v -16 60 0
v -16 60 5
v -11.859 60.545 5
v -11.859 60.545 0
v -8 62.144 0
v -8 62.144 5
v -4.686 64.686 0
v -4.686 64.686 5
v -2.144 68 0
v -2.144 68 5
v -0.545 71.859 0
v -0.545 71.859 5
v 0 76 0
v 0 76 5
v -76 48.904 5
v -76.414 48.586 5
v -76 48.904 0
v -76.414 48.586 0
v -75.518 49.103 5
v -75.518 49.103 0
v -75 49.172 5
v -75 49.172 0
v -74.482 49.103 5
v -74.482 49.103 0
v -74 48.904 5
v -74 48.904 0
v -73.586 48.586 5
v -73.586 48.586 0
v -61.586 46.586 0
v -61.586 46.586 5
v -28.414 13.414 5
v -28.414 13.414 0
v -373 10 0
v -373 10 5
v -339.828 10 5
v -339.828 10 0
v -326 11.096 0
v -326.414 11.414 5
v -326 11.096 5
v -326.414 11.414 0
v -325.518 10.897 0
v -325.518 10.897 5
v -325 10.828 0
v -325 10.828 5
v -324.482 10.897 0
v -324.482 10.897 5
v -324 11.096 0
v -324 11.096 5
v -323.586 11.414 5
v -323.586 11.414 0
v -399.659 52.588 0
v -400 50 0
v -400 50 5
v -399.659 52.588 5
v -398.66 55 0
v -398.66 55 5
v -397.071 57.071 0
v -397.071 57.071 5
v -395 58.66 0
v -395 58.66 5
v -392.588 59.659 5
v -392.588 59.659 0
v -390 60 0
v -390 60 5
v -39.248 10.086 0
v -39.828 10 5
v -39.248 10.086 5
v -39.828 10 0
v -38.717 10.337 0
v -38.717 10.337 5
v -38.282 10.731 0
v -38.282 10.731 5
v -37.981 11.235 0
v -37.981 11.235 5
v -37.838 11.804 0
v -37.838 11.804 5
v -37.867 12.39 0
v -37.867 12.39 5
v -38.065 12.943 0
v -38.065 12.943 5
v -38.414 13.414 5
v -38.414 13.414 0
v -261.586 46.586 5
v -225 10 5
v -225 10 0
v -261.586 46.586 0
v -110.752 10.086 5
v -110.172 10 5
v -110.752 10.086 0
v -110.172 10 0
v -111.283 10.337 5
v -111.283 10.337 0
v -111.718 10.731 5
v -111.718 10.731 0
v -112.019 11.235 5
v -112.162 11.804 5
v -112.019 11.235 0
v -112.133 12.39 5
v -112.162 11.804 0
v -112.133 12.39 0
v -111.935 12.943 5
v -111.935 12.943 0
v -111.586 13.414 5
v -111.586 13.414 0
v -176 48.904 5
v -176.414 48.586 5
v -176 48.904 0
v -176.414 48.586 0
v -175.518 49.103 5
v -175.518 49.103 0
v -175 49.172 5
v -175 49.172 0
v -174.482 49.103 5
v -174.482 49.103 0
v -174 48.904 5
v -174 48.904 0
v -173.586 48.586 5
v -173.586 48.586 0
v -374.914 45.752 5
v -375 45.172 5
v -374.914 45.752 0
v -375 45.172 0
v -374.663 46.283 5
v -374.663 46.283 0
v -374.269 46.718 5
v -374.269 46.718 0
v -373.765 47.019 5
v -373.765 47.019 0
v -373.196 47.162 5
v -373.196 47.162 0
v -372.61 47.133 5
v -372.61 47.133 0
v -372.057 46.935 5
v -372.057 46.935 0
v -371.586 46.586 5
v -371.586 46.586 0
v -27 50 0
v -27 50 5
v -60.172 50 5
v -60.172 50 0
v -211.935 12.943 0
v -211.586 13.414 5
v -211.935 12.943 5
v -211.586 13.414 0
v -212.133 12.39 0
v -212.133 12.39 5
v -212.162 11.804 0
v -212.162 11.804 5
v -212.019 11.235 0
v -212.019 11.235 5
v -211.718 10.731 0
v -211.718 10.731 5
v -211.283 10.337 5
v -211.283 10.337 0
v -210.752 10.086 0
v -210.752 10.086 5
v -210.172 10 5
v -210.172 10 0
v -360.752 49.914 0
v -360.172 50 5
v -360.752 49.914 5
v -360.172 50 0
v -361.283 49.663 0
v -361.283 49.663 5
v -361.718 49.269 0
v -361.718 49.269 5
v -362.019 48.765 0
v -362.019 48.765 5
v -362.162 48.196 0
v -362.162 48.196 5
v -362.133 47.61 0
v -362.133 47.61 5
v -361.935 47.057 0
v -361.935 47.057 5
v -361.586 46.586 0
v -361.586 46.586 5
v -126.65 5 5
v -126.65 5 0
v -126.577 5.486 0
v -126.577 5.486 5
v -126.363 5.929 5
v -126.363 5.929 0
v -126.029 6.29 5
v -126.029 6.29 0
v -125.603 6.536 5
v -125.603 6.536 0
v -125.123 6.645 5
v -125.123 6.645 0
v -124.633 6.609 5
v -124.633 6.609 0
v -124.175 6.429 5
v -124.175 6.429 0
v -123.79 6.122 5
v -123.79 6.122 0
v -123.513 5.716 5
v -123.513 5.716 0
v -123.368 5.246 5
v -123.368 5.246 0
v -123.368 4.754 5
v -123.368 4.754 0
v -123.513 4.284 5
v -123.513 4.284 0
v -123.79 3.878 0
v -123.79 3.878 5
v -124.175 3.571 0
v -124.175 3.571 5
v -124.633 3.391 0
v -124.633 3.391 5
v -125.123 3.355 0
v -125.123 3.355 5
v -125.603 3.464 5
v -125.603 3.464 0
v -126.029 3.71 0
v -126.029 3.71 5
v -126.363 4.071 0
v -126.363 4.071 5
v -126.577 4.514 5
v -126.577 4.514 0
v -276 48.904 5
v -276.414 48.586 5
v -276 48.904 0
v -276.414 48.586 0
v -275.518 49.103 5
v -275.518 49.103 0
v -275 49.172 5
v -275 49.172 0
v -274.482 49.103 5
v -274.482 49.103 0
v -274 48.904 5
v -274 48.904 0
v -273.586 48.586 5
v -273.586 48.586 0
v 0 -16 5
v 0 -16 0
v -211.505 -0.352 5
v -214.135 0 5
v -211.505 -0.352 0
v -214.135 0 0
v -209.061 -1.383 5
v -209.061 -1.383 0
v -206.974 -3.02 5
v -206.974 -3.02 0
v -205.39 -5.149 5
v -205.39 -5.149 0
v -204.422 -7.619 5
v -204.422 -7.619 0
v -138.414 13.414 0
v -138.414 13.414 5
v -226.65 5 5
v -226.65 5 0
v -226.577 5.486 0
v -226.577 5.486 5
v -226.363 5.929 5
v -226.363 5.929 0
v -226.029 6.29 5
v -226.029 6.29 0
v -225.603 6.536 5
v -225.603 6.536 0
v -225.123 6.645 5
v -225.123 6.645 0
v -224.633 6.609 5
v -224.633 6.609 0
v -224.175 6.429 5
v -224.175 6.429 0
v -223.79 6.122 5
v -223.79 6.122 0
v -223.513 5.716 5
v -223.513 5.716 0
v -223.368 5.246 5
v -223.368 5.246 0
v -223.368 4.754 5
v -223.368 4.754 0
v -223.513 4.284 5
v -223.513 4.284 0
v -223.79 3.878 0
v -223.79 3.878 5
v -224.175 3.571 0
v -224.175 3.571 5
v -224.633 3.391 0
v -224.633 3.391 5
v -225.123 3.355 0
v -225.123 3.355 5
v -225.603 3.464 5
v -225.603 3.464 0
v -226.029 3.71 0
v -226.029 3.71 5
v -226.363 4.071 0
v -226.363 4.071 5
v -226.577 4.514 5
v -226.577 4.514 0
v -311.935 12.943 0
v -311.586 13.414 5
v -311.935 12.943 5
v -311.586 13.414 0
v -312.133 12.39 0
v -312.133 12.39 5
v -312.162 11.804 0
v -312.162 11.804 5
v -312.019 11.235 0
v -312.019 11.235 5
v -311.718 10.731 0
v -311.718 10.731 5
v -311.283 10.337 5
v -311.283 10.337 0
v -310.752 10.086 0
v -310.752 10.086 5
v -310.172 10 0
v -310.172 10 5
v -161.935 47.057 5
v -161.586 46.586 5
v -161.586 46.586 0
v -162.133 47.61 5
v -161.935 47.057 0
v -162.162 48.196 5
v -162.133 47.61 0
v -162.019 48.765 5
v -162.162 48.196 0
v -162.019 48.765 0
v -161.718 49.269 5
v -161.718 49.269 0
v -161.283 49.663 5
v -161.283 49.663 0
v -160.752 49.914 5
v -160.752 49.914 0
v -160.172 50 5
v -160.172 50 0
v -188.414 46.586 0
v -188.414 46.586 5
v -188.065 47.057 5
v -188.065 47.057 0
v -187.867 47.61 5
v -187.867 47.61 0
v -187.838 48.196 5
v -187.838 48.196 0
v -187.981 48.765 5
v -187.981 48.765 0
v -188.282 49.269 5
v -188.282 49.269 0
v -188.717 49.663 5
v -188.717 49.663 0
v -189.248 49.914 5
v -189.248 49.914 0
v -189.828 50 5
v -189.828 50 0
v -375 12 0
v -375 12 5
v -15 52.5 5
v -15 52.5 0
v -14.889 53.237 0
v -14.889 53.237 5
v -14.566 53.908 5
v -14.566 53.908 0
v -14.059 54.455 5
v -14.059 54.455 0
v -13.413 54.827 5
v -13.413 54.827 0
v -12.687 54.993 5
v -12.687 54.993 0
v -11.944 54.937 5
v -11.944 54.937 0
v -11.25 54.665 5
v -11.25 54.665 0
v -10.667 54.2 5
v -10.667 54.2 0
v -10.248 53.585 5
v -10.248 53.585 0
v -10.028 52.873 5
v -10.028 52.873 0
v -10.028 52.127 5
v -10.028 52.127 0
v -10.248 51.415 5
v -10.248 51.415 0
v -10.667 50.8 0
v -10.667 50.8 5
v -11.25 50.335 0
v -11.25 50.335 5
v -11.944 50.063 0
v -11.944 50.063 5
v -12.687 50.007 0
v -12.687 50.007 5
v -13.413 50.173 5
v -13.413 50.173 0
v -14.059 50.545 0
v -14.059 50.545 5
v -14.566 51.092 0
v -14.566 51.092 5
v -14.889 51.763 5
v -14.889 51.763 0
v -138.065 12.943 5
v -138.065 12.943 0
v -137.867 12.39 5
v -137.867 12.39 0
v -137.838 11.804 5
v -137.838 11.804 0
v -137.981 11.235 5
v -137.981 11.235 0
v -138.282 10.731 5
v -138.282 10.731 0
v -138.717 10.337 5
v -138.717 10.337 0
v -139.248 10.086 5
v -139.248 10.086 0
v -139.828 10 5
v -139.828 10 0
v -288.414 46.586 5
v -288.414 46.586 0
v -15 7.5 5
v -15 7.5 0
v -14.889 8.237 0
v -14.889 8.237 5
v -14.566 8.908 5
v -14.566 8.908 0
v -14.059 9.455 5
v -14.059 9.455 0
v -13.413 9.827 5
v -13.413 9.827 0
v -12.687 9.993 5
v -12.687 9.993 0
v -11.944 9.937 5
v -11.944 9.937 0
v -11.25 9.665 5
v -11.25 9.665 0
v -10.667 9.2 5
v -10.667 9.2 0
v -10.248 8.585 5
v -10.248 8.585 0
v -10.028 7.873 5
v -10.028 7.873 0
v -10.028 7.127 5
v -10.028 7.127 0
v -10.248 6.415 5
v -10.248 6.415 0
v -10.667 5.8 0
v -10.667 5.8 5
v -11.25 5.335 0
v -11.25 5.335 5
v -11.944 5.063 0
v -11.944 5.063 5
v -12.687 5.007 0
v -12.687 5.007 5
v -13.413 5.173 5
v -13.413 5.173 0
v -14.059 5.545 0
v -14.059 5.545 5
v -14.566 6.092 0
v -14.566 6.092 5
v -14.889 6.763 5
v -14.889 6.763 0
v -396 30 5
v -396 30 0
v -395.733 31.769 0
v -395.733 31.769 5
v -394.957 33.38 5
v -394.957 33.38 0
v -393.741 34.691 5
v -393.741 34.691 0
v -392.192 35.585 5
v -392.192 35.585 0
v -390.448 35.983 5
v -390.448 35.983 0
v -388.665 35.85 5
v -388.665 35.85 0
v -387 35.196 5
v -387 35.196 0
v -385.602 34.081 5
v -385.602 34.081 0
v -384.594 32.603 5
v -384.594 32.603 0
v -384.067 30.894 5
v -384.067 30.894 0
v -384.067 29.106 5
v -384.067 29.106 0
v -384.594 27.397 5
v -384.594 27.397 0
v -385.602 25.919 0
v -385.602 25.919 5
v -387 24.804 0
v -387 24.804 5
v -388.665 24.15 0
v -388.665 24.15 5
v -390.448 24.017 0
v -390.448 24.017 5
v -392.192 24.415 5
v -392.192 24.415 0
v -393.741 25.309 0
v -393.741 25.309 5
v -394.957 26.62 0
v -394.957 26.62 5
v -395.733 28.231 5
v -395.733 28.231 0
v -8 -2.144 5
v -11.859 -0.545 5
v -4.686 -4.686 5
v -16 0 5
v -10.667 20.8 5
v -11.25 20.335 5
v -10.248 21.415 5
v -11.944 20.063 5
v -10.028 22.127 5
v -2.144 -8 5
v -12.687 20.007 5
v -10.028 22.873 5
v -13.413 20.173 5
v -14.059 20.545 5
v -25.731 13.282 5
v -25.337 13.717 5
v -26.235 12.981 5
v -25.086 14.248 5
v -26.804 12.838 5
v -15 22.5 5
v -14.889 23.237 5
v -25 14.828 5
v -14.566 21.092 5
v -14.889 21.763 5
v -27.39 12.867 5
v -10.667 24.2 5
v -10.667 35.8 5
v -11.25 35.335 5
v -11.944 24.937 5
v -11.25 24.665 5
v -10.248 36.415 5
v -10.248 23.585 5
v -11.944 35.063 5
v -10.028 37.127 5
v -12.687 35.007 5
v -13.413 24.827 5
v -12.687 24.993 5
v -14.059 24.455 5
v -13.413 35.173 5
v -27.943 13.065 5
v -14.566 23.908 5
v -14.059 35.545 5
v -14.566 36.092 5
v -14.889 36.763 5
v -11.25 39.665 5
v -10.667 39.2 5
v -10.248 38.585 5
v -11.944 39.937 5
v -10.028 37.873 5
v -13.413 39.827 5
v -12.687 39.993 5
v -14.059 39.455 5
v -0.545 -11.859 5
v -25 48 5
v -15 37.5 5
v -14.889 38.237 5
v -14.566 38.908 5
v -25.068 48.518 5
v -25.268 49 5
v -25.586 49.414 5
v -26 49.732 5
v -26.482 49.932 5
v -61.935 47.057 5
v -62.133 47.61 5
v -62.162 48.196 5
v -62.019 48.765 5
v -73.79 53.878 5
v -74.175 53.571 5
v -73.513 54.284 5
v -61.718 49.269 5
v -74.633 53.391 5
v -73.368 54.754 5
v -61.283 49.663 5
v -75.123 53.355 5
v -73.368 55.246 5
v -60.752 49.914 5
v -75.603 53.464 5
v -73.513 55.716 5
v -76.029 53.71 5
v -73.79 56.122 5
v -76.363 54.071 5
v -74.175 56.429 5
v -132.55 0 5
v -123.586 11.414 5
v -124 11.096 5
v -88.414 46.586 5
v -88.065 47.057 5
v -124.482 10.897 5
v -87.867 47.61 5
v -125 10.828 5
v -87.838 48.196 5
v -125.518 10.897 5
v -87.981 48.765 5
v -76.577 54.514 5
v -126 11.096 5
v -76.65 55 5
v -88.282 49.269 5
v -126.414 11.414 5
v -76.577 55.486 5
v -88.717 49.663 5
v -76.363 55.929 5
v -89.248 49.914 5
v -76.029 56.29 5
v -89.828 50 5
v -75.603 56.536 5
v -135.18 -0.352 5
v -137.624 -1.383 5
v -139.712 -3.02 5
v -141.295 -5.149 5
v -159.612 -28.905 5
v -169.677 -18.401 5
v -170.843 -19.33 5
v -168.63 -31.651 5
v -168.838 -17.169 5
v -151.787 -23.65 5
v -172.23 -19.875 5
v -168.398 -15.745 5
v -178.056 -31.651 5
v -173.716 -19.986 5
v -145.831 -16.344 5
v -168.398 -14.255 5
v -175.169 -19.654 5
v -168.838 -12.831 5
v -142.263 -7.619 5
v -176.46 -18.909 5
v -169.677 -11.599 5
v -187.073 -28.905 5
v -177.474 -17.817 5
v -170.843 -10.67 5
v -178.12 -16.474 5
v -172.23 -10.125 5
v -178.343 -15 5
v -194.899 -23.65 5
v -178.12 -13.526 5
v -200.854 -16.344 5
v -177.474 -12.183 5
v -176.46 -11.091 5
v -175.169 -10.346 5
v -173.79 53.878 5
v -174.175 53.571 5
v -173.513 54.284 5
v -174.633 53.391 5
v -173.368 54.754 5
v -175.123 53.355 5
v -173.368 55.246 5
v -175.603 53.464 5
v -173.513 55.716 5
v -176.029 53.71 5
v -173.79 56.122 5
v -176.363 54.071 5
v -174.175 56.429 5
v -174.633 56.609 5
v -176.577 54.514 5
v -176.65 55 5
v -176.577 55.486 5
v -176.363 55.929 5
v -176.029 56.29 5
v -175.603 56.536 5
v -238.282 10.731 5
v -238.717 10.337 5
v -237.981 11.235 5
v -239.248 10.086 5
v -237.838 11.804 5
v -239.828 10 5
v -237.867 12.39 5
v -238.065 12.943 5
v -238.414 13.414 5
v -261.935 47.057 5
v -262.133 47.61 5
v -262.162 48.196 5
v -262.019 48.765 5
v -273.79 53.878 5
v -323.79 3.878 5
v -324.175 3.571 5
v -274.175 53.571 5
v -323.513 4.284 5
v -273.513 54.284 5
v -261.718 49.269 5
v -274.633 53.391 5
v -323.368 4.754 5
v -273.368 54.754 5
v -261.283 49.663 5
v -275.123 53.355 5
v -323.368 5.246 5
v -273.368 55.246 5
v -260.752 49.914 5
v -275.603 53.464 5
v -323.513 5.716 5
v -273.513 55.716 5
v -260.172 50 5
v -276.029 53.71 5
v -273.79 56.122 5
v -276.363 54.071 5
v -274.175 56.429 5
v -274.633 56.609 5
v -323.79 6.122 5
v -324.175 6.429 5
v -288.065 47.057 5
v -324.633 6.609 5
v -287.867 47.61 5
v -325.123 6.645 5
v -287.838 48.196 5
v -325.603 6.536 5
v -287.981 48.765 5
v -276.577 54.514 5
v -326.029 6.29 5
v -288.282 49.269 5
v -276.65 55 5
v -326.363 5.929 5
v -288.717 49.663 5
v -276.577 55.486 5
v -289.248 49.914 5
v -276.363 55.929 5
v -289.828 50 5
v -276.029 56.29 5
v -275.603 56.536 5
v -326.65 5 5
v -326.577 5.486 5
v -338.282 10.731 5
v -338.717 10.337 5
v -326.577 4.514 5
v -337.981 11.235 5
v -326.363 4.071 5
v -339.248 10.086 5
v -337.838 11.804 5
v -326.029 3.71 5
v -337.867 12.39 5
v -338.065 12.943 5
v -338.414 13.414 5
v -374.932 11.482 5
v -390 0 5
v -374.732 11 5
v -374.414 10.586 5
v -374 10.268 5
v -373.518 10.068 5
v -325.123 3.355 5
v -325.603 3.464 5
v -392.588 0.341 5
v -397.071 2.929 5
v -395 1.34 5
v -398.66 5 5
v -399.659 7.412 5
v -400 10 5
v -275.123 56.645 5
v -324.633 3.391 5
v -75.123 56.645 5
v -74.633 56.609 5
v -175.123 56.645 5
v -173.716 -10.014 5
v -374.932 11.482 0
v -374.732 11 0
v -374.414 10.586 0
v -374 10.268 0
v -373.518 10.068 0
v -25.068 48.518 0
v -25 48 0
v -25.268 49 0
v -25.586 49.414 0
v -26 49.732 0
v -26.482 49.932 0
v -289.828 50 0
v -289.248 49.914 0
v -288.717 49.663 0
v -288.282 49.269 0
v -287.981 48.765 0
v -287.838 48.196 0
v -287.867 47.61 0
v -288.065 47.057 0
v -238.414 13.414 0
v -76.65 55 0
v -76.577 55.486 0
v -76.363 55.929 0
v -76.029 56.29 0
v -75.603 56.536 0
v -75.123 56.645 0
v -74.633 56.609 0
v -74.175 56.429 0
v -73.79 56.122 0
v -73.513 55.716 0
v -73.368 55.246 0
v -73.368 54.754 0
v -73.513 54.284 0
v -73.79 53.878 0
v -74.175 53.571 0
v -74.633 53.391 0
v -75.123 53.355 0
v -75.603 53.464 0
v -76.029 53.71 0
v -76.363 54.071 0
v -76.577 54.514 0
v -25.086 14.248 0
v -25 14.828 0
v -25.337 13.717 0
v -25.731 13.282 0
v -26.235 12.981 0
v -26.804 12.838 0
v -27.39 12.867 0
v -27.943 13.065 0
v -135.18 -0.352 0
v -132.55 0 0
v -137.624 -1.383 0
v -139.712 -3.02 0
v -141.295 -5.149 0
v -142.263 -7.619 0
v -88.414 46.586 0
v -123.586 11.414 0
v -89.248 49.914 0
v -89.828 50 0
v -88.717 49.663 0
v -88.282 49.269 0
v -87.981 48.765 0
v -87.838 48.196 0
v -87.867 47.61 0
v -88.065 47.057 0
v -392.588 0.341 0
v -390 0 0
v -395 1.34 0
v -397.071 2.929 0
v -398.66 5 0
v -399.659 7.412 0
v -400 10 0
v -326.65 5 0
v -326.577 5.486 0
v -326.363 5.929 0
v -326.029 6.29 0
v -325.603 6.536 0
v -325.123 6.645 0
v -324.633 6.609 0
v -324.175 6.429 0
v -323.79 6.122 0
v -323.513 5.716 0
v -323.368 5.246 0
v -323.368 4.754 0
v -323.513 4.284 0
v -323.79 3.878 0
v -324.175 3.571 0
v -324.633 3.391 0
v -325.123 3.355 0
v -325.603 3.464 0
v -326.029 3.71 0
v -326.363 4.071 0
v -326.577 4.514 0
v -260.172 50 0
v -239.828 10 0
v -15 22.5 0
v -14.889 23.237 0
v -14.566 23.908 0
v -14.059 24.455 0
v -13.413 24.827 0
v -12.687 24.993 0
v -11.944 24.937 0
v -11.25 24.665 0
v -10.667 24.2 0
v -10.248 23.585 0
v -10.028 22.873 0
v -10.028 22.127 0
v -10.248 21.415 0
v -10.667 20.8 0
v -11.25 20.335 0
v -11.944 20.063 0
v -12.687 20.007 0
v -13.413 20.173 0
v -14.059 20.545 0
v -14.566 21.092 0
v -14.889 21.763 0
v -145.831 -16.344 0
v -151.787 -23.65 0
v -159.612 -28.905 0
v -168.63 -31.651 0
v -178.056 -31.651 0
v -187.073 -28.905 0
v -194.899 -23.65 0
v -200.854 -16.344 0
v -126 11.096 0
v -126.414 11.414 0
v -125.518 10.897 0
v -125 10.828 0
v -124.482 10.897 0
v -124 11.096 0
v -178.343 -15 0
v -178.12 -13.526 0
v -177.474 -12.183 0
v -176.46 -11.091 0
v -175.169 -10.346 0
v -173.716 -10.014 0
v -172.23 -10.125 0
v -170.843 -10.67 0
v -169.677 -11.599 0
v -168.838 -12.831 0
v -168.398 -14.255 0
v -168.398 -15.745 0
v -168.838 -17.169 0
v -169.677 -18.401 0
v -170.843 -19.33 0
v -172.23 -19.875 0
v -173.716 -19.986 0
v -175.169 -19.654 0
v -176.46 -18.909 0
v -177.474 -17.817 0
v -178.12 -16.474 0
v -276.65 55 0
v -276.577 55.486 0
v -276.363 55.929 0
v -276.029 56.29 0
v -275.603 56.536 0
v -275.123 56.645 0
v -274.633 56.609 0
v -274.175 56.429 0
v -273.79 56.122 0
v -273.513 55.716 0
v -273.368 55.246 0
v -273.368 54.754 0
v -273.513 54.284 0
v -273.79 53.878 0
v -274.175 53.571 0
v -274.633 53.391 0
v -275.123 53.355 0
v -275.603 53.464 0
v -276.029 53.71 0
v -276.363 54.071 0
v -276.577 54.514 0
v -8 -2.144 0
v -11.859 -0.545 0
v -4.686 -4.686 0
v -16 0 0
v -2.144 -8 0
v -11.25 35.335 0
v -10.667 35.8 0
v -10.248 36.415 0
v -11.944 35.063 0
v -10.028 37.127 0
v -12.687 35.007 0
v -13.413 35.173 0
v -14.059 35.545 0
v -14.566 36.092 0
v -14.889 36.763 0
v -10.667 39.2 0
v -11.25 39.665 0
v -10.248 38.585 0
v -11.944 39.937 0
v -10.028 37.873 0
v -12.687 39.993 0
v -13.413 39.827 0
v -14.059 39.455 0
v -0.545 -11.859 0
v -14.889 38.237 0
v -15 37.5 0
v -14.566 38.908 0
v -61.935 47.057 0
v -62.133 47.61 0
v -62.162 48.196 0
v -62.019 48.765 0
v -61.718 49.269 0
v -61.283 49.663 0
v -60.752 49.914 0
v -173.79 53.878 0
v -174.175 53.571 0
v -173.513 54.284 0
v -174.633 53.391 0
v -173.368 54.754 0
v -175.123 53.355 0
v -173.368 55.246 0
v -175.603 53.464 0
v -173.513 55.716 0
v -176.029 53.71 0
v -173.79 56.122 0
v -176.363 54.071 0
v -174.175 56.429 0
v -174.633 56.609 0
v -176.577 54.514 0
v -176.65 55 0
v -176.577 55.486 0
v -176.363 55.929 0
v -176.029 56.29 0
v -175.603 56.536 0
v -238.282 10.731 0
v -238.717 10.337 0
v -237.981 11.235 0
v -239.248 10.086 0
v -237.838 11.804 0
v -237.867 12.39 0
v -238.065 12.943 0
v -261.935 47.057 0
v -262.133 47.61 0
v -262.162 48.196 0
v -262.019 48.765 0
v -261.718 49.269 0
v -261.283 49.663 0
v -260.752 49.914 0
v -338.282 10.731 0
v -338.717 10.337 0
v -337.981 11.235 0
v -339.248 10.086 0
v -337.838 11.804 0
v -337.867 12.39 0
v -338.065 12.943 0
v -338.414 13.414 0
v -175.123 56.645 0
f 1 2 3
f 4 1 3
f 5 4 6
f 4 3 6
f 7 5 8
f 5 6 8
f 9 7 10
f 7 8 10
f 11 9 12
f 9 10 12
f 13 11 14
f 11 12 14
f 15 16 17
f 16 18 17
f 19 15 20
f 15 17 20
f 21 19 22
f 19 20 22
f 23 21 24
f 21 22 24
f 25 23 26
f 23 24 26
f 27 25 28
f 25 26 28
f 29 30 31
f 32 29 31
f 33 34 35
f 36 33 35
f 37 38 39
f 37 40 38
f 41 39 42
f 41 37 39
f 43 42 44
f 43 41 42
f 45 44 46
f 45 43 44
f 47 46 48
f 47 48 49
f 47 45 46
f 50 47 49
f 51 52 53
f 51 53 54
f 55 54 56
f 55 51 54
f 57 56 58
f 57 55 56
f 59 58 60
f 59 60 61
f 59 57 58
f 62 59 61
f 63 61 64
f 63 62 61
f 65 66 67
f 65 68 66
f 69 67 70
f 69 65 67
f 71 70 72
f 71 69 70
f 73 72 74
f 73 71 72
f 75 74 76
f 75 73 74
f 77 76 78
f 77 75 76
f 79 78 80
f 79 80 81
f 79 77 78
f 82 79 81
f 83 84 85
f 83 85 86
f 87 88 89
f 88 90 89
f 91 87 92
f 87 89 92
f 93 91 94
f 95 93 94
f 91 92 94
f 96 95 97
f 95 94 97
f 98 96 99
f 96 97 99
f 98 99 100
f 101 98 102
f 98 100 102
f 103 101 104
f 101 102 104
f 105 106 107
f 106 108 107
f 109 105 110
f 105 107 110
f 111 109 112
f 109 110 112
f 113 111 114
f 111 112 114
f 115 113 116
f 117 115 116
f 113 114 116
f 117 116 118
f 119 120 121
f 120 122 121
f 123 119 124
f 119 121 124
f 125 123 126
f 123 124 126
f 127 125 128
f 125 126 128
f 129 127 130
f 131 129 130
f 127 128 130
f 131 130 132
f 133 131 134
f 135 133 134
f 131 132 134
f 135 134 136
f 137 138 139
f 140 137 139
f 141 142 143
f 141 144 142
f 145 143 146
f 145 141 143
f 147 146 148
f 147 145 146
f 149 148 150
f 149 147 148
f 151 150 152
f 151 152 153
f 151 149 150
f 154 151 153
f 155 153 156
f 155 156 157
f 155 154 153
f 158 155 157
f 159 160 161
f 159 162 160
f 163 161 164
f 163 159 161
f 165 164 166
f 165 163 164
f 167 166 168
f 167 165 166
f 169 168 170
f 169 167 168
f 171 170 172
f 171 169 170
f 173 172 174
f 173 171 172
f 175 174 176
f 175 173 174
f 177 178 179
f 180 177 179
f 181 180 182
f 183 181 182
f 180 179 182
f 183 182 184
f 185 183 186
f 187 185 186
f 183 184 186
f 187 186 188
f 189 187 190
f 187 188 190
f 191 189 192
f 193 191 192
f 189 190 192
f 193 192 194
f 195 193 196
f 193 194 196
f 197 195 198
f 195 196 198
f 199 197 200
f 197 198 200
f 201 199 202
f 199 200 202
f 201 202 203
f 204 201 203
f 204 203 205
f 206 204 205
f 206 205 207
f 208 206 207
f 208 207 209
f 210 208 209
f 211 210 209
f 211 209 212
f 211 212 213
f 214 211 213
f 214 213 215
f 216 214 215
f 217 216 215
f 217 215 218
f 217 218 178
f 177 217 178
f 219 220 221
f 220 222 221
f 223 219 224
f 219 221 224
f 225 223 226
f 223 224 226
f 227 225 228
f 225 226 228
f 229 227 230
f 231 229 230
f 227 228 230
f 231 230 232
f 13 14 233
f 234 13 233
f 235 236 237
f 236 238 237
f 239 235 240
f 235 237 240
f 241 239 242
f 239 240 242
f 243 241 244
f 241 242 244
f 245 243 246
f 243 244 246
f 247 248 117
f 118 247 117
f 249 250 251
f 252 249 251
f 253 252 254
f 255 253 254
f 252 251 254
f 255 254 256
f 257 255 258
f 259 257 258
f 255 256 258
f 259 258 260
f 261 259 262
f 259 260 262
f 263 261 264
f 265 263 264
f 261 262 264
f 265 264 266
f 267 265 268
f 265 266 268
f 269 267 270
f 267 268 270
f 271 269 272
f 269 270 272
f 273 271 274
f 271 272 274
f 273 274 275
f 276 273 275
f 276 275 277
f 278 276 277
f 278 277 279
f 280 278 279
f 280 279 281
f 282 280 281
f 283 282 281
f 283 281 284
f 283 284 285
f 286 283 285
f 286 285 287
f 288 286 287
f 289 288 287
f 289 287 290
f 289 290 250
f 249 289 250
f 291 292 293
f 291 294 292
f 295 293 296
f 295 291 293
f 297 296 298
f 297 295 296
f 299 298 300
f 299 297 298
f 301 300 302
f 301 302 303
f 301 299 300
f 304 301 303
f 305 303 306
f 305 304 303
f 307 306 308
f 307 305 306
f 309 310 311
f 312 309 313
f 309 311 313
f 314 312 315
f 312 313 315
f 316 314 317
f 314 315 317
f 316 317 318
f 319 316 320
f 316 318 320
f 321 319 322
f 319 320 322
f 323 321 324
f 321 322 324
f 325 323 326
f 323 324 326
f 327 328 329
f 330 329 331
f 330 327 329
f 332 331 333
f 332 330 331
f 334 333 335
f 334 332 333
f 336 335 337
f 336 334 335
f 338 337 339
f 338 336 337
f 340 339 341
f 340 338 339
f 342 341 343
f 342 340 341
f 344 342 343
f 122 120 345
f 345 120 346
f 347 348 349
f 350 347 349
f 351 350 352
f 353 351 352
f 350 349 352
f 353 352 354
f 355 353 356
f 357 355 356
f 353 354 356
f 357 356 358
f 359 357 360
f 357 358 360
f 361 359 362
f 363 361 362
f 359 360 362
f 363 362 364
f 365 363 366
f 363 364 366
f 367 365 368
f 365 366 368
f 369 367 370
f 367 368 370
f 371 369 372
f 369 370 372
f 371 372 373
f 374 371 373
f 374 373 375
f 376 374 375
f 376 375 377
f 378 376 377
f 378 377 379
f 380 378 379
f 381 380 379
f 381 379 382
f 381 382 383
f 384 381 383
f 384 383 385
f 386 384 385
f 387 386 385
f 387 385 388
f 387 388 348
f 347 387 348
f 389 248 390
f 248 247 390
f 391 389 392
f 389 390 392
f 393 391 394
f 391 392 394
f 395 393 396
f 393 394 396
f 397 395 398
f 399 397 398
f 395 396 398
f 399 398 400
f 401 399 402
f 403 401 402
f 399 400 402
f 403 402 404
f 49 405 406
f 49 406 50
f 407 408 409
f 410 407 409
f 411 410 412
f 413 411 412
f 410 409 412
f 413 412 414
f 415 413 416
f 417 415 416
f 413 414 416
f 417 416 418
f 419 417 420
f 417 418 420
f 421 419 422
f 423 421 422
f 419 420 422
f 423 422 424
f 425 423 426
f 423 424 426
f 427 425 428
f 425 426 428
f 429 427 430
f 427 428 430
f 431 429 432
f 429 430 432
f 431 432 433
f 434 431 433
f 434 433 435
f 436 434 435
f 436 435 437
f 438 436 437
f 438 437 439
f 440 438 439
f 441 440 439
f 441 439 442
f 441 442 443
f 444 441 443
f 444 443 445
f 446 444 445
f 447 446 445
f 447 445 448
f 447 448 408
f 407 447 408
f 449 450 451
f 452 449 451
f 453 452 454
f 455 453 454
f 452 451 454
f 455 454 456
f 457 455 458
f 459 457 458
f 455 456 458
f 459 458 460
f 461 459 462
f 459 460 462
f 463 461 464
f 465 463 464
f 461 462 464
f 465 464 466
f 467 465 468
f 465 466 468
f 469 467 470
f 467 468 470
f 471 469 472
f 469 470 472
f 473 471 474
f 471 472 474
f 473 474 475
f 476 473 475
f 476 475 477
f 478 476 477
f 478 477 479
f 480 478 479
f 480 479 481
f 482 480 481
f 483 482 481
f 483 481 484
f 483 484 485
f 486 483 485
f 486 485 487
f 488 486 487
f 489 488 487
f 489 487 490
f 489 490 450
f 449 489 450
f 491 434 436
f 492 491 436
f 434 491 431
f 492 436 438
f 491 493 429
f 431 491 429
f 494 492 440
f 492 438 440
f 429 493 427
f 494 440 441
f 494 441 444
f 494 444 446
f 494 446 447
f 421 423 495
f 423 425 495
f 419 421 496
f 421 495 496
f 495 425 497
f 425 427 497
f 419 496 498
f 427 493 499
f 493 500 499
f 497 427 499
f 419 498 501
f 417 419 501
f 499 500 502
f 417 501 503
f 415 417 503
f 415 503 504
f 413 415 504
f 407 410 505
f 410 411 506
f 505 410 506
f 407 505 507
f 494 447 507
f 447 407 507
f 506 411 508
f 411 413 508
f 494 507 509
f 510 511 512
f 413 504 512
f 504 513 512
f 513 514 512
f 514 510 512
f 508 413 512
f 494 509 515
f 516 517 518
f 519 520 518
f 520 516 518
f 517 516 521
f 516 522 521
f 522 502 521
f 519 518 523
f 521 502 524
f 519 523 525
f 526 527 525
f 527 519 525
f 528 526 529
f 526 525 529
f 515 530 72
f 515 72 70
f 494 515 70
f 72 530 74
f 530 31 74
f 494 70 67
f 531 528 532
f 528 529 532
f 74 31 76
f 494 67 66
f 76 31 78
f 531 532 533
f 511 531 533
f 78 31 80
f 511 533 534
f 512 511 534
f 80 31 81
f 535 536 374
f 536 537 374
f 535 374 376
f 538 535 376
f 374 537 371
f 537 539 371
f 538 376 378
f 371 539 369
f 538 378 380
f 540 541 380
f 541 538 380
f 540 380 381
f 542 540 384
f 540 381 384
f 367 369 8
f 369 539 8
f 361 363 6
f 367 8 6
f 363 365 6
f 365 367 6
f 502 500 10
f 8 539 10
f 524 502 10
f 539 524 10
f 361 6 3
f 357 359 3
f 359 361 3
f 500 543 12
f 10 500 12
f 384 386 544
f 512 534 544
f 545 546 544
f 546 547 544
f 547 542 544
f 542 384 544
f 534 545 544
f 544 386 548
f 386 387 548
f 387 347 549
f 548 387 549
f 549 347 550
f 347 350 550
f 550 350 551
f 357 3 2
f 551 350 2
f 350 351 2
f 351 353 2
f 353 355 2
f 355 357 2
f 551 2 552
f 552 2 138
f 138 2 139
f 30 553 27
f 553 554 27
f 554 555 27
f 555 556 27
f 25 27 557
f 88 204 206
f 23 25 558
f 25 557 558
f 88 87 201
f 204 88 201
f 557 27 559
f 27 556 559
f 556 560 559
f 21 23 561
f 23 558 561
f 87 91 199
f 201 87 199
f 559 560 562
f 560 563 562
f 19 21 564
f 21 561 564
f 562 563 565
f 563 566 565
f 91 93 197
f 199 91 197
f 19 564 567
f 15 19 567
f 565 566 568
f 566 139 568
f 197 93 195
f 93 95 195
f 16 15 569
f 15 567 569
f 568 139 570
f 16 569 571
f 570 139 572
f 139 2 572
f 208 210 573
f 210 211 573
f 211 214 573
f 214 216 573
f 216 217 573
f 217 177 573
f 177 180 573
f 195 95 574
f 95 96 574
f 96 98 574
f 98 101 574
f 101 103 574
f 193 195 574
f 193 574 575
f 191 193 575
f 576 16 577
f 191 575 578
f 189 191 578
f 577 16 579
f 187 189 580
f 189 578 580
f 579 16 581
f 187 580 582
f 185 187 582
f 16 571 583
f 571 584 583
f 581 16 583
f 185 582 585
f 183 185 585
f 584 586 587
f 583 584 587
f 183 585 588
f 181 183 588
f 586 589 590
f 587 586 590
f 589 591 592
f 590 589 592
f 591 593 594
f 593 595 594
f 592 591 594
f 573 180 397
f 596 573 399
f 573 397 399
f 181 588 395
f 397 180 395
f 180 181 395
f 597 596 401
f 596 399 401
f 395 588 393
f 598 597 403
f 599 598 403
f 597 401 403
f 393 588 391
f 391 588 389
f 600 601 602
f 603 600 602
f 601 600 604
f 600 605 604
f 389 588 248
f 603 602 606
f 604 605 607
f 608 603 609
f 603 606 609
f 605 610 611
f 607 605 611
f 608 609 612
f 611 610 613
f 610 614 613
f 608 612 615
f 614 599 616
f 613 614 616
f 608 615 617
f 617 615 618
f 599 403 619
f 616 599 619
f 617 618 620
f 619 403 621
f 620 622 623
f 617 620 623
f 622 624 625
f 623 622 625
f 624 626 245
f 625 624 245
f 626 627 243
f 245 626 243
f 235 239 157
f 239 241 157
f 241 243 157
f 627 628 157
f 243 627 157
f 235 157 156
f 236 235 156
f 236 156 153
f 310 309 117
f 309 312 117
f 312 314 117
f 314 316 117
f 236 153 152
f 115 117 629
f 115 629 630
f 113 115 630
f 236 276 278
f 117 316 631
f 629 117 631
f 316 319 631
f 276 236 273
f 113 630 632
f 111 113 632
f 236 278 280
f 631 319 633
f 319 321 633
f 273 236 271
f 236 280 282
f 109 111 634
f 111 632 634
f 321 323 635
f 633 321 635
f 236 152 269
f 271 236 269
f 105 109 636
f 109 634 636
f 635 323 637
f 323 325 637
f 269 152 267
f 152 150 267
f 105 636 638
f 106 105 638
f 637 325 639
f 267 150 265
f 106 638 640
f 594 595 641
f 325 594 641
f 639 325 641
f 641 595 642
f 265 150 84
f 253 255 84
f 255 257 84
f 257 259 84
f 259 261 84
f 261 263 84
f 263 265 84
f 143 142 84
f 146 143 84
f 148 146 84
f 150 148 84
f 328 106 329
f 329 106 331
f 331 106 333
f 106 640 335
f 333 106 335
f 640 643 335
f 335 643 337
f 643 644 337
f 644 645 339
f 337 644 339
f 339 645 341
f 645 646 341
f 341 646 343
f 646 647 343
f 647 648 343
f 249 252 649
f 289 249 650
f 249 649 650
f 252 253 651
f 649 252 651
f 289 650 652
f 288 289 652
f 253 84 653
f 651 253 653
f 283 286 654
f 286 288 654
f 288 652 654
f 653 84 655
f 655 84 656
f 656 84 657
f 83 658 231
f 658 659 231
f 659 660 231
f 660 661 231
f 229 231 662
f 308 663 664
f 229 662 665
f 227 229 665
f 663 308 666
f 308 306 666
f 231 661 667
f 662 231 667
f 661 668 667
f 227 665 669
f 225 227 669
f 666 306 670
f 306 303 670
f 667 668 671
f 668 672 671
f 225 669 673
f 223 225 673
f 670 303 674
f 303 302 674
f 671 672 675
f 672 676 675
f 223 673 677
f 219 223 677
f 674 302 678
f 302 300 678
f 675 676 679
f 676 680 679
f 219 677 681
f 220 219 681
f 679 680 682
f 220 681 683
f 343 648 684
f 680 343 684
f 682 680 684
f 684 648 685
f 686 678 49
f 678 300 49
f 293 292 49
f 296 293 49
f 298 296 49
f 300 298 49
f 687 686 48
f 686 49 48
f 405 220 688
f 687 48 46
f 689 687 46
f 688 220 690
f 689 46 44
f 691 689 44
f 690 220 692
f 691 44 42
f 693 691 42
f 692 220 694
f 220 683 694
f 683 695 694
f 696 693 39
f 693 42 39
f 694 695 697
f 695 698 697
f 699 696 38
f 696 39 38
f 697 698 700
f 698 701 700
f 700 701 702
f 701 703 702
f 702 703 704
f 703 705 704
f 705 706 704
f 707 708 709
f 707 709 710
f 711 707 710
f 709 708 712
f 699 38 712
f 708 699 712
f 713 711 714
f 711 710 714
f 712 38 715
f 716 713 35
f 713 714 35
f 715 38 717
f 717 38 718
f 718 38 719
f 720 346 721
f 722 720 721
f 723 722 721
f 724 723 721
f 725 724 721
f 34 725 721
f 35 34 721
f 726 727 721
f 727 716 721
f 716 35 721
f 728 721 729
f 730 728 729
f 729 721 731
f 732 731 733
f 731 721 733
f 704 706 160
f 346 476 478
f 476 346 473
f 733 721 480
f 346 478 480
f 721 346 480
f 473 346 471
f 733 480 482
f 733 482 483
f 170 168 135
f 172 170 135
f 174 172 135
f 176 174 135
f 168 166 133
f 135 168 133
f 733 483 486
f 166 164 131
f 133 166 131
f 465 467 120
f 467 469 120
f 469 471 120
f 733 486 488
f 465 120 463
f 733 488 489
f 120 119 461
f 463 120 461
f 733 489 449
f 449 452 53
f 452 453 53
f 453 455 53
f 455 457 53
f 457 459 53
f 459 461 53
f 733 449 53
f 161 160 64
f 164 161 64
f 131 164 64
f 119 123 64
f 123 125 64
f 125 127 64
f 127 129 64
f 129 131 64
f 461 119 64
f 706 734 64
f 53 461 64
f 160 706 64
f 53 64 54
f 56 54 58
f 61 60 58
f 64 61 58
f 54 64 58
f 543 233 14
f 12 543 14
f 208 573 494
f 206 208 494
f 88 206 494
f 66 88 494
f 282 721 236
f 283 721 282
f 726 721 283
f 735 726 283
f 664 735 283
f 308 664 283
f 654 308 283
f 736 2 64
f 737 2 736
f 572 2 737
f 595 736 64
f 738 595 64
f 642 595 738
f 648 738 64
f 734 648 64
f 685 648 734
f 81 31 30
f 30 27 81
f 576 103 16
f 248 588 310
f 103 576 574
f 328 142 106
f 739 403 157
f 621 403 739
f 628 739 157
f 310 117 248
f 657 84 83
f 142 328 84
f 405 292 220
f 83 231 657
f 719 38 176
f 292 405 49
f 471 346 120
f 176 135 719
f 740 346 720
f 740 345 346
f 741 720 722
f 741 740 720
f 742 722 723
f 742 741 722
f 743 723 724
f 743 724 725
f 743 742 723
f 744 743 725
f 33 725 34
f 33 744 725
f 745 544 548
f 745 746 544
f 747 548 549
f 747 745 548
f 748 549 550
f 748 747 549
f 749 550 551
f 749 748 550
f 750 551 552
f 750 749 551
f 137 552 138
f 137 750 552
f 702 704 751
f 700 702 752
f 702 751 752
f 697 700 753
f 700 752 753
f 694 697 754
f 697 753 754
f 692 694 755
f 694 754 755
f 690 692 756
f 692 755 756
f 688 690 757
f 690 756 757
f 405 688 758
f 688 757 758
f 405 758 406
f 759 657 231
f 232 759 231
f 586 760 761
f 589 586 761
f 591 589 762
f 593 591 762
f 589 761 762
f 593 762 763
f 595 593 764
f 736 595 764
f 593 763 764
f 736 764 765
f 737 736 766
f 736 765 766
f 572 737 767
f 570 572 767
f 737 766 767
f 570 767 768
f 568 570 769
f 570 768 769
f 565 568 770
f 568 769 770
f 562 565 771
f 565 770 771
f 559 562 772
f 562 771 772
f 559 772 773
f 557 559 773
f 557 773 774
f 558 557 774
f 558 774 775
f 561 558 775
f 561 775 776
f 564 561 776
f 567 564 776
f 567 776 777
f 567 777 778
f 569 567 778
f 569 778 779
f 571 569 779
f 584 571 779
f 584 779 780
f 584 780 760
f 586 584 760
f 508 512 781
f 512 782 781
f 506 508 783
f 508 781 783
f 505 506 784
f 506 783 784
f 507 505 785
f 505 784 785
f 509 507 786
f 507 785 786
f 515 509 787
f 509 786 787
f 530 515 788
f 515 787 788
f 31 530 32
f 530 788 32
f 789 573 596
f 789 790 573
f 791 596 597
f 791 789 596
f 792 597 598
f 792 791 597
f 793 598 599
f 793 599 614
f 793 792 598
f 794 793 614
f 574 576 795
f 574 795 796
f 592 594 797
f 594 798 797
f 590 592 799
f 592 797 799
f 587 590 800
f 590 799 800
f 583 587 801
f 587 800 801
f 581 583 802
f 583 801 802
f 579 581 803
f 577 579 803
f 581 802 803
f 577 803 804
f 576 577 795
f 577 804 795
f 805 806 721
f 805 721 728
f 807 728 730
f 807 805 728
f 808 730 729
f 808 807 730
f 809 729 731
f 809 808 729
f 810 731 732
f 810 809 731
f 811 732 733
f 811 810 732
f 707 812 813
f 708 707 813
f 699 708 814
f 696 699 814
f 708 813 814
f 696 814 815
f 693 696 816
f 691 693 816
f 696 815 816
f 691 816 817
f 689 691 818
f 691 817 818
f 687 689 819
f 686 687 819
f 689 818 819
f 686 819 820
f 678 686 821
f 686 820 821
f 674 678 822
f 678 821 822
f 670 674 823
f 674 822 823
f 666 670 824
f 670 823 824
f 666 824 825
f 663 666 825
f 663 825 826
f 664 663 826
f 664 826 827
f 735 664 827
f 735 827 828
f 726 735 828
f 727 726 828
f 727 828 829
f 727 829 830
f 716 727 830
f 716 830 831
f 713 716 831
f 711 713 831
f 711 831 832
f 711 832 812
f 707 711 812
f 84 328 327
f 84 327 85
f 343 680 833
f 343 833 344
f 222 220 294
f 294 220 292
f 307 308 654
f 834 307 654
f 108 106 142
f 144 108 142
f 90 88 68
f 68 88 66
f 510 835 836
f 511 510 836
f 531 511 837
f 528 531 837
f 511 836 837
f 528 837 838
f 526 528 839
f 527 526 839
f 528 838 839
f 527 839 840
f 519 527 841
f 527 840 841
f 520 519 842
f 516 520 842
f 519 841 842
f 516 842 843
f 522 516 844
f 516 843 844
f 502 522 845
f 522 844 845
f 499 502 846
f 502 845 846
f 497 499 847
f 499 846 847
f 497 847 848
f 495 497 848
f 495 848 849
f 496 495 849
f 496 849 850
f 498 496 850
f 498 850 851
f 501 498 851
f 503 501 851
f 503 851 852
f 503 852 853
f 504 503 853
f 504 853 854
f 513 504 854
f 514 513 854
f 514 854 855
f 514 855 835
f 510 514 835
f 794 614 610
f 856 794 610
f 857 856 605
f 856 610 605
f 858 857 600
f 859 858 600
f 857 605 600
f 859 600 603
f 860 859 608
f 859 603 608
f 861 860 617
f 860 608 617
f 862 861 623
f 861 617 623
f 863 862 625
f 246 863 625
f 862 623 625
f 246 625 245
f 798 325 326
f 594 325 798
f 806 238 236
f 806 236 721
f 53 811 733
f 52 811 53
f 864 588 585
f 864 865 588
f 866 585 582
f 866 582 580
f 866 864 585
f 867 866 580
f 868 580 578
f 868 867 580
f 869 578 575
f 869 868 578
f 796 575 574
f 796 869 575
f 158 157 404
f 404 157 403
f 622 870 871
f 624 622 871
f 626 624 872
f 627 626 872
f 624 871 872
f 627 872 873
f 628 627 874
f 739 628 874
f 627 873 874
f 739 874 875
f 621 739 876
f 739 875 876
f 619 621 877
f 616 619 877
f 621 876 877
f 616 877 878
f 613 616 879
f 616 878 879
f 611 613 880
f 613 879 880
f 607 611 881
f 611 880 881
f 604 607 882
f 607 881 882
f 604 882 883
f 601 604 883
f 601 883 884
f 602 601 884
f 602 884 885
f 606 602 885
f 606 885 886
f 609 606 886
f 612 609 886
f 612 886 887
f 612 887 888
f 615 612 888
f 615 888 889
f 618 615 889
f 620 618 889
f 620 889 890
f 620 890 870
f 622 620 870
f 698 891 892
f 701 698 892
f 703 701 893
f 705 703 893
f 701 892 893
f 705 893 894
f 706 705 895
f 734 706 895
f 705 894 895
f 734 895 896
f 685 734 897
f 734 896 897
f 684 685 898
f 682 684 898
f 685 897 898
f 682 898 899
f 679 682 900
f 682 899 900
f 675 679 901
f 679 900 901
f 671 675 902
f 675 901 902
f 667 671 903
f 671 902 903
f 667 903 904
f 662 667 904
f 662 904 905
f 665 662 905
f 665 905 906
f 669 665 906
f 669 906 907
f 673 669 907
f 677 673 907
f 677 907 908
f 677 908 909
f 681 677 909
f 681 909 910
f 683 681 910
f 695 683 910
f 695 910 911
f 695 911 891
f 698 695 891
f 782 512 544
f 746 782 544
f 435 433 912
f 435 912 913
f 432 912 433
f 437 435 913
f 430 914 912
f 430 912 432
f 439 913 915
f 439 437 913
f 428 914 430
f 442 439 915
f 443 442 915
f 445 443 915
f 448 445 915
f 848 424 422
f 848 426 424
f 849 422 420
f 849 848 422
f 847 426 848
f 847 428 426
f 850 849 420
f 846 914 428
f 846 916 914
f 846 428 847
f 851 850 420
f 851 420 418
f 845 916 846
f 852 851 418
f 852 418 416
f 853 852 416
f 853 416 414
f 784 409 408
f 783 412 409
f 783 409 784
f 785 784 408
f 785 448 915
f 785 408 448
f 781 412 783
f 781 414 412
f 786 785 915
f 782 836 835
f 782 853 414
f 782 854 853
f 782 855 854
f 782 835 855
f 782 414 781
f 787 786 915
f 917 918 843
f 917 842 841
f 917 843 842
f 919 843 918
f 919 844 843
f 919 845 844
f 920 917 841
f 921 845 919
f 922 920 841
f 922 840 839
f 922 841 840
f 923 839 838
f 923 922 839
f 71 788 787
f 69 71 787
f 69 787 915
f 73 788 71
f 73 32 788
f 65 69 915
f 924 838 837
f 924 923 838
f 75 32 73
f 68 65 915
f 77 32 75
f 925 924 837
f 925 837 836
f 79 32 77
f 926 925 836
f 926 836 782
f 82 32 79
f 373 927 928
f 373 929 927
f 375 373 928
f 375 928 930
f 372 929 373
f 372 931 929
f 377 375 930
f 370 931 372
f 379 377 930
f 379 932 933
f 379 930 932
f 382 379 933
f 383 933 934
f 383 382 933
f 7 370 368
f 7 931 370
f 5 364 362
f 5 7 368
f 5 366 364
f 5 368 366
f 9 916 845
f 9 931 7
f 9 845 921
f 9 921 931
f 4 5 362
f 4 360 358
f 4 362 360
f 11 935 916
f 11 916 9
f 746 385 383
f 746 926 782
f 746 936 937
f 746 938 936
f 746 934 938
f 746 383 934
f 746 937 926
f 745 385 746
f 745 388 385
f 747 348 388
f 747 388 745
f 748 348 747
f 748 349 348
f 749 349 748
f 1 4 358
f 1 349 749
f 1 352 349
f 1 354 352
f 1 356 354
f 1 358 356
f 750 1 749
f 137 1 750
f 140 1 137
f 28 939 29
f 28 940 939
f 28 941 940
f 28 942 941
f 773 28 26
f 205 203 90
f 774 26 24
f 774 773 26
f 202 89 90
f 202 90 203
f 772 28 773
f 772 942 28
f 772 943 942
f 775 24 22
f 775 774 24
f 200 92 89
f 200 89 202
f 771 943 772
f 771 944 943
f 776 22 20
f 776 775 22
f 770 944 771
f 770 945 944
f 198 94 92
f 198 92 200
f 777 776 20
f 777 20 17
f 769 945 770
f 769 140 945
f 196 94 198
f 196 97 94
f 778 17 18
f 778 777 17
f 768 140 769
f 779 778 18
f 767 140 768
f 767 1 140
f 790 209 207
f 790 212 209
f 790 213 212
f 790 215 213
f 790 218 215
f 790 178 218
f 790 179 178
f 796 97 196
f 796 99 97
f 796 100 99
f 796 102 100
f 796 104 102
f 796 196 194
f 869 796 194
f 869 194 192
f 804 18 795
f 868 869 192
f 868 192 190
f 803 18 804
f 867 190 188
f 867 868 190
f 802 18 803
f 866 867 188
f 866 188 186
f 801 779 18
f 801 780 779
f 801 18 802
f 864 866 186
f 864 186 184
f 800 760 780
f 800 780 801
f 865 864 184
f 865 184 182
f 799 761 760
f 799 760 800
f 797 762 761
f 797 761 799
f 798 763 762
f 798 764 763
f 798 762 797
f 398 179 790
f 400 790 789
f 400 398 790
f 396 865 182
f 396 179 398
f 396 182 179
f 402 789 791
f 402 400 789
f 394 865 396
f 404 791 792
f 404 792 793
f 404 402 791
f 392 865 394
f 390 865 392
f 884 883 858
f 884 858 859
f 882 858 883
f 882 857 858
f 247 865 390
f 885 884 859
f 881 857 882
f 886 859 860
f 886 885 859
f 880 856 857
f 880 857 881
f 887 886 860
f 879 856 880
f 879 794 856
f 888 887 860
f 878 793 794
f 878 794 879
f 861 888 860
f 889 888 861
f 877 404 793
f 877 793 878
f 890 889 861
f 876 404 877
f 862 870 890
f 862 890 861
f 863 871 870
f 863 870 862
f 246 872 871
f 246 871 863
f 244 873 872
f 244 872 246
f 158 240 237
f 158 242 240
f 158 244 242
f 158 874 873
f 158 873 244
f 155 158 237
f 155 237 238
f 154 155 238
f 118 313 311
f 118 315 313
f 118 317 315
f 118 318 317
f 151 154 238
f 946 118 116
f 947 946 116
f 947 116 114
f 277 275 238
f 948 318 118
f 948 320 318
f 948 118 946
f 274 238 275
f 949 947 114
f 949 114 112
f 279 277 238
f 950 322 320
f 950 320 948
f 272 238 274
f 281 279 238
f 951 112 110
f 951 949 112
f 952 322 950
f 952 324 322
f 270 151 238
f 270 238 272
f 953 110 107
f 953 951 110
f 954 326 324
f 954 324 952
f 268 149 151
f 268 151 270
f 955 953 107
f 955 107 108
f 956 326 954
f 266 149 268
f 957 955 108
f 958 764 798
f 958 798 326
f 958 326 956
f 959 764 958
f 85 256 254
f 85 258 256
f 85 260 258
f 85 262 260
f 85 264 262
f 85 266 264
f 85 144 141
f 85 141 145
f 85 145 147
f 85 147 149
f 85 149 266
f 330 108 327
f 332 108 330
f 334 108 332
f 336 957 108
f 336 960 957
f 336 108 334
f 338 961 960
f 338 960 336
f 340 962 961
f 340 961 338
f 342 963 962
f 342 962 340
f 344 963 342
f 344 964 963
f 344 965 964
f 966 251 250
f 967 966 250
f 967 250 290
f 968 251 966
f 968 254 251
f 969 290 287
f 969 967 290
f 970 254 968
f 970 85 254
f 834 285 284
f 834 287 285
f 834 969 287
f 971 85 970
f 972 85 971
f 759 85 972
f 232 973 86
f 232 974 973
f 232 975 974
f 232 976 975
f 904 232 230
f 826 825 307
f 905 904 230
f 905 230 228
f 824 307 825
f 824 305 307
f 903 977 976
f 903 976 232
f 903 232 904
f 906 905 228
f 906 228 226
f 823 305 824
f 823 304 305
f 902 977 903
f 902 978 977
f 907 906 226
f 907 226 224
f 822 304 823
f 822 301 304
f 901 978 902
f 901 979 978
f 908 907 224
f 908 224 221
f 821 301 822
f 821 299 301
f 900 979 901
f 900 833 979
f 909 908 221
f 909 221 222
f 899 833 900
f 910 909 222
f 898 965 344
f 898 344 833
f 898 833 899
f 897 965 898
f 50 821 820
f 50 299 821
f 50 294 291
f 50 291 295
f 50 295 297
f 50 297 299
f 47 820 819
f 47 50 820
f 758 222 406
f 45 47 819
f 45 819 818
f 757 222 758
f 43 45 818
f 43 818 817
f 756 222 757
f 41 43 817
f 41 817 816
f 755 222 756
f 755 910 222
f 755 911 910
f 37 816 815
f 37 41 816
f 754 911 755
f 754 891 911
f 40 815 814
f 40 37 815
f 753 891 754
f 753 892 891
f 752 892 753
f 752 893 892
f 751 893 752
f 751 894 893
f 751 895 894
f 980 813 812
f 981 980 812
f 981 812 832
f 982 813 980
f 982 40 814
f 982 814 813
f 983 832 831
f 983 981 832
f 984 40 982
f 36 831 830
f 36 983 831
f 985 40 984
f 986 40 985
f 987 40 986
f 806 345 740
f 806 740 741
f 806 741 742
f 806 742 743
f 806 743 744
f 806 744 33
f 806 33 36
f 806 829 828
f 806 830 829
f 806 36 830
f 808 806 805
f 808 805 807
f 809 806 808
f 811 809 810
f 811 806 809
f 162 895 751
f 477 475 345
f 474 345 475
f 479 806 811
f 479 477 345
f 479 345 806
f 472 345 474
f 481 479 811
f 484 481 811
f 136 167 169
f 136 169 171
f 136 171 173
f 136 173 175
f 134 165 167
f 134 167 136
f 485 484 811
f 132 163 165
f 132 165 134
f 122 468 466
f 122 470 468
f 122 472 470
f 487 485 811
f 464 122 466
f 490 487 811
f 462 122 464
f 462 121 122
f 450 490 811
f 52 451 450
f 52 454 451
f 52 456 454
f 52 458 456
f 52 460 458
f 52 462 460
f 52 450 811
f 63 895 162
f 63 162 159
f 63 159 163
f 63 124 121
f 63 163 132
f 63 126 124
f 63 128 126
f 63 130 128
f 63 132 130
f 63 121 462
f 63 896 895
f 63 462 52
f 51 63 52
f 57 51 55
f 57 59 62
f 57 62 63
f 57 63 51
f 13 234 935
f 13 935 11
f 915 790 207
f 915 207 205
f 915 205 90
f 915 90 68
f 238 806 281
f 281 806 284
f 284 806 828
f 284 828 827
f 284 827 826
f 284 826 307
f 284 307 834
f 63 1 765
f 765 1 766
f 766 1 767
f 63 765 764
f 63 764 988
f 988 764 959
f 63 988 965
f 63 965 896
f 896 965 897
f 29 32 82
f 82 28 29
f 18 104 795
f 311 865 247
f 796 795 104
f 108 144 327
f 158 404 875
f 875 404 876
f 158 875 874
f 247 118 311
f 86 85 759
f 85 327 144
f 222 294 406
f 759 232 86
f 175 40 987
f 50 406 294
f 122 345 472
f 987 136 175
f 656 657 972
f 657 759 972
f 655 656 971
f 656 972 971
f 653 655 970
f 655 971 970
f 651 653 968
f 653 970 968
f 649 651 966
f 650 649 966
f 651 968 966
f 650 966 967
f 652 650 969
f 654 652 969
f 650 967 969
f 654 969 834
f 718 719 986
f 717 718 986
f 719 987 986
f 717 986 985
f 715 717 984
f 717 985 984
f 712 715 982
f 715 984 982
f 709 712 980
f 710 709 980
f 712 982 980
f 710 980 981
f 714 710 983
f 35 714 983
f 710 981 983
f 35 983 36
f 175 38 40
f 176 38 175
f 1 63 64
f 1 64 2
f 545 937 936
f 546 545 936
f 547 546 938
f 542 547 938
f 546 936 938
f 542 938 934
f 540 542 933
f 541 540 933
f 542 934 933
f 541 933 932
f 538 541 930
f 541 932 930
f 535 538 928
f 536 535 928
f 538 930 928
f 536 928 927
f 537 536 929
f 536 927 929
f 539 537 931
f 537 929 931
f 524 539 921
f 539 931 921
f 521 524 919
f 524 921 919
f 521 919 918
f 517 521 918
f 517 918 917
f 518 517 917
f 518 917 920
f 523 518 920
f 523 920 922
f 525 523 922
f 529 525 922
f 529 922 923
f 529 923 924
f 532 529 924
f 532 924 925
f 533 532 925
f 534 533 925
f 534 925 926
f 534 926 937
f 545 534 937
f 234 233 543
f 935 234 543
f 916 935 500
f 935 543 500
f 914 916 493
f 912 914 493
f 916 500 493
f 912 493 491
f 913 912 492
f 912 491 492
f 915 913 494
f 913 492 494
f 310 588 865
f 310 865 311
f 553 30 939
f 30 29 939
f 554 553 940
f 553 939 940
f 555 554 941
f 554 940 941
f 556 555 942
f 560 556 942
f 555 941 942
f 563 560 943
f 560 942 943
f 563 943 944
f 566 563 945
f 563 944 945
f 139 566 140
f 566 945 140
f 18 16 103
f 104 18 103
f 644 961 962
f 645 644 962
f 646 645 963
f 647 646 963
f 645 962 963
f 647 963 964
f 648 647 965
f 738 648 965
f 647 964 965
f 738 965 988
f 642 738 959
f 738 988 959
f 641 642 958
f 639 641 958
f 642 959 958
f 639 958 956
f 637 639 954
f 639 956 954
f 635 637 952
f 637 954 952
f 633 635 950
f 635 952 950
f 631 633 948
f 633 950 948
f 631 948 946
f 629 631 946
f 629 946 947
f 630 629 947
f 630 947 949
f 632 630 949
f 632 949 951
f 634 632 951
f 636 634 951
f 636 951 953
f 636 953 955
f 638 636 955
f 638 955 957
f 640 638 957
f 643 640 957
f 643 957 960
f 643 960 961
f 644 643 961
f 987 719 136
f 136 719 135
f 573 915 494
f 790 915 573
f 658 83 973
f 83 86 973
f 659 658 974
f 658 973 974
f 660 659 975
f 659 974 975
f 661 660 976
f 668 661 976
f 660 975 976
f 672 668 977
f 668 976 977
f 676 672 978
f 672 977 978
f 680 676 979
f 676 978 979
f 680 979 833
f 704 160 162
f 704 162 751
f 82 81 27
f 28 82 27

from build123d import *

# Parameters (mm, degrees)
BOSS_EXTRUDE1_DEPTH        = 5
CUT_EXTRUDE2_DEPTH         = 5
CUT_EXTRUDE3_REACH         = 7
FILLET1_R                  = 2
M6X1_0_TAPPED_HOLE1_D      = 5
M4X0_7_TAPPED_HOLE1_D      = 3.3
BOSS_EXTRUDE2_DEPTH        = 5
FILLET2_R                  = 10
F_10_0MM_DOWEL_HOLE1_D     = 10
BOSS_EXTRUDE3_DEPTH        = 5
F_12_0MM_DOWEL_HOLE1_D     = 12
F_12_0MM_DOWEL_HOLE1_DEPTH = 5


with BuildPart() as part:
    # Sketch1 → Boss-Extrude1 (new body)
    with BuildSketch(Plane.XY):
        with BuildLine():
            Line((-10, 0), (-390, 0))
            ThreePointArc((-390, 0), (-397.071067812, 2.928932188), (-400, 10))
            Line((-400, 10), (-400, 50))
            ThreePointArc((-400, 50), (-397.071067812, 57.071067812), (-390, 60))
            Line((-390, 60), (-10, 60))
            ThreePointArc((-10, 60), (-2.928932188, 57.071067812), (0, 50))
            Line((0, 50), (0, 10))
            ThreePointArc((0, 10), (-2.928932188, 2.928932188), (-10, 0))
        make_face()
    extrude(amount=BOSS_EXTRUDE1_DEPTH)

    # Sketch2 → Cut-Extrude2 (cut)
    with BuildSketch(Plane.XY.offset(5)):
        Polygon((-375, 10), (-365, 10), (-365, 40), (-375, 50), align=None)
        Polygon((-365, 40), (-365, 10), (-355, 10), (-355, 30), align=None)
        Polygon((-355, 30), (-355, 10), (-345, 10), (-345, 20), align=None)
        Polygon((-345, 20), (-345, 10), (-335, 10), align=None)
        Polygon((-305, 20), (-315, 10), (-305, 10), align=None)
        Polygon((-305, 20), (-305, 10), (-295, 10), (-295, 30), align=None)
        Polygon((-295, 30), (-295, 10), (-285, 10), (-285, 40), align=None)
        Polygon((-285, 40), (-285, 10), (-275, 10), (-275, 50), align=None)
        Polygon((-275, 50), (-275, 10), (-265, 10), (-265, 40), align=None)
        Polygon((-265, 40), (-265, 10), (-255, 10), (-255, 30), align=None)
        Polygon((-255, 30), (-255, 10), (-245, 10), (-245, 20), align=None)
        Polygon((-245, 20), (-245, 10), (-235, 10), align=None)
        Polygon((-205, 20), (-215, 10), (-205, 10), align=None)
        Polygon((-205, 20), (-205, 10), (-195, 10), (-195, 30), align=None)
        Polygon((-195, 30), (-195, 10), (-185, 10), (-185, 40), align=None)
        Polygon((-185, 40), (-185, 10), (-175, 10), (-175, 50), align=None)
        Polygon((-175, 50), (-175, 10), (-165, 10), (-165, 40), align=None)
        Polygon((-165, 40), (-165, 10), (-155, 10), (-155, 30), align=None)
        Polygon((-155, 30), (-155, 10), (-145, 10), (-145, 20), align=None)
        Polygon((-145, 20), (-145, 10), (-135, 10), align=None)
        Polygon((-45, 20), (-45, 10), (-35, 10), align=None)
        Polygon((-55, 30), (-55, 10), (-45, 10), (-45, 20), align=None)
        Polygon((-65, 40), (-65, 10), (-55, 10), (-55, 30), align=None)
        Polygon((-75, 50), (-75, 10), (-65, 10), (-65, 40), align=None)
        Polygon((-85, 40), (-85, 10), (-75, 10), (-75, 50), align=None)
        Polygon((-95, 30), (-95, 10), (-85, 10), (-85, 40), align=None)
        Polygon((-105, 20), (-105, 10), (-95, 10), (-95, 30), align=None)
        Polygon((-105, 20), (-115, 10), (-105, 10), align=None)
        Polygon((-25, 50), (-35, 50), (-35, 20), (-25, 10), align=None)
        Polygon((-35, 50), (-45, 50), (-45, 30), (-35, 20), align=None)
        Polygon((-45, 50), (-55, 50), (-55, 40), (-45, 30), align=None)
        Polygon((-55, 50), (-65, 50), (-55, 40), align=None)
    extrude(amount=-CUT_EXTRUDE2_DEPTH, mode=Mode.SUBTRACT)

    # Sketch3 → Cut-Extrude3 (cut, up to next)
    with BuildSketch(Plane.XY.offset(5), mode=Mode.PRIVATE) as cut_extrude3_sk1:
        Polygon((-365, 50), (-285, 50), (-325, 10), align=None)
    cut_extrude3_tool1 = extrude(cut_extrude3_sk1.sketch, amount=-CUT_EXTRUDE3_REACH, mode=Mode.PRIVATE) & part.part
    add(cut_extrude3_tool1.solids().sort_by_distance((-325, 36.666667, 5))[0], mode=Mode.SUBTRACT)
    # Sketch3 → Cut-Extrude3 (cut, up to next)
    with BuildSketch(Plane.XY.offset(5), mode=Mode.PRIVATE) as cut_extrude3_sk2:
        Polygon((-225, 10), (-265, 50), (-185, 50), align=None)
    cut_extrude3_tool2 = extrude(cut_extrude3_sk2.sketch, amount=-CUT_EXTRUDE3_REACH, mode=Mode.PRIVATE) & part.part
    add(cut_extrude3_tool2.solids().sort_by_distance((-225, 36.666667, 5))[0], mode=Mode.SUBTRACT)
    # Sketch3 → Cut-Extrude3 (cut, up to next)
    with BuildSketch(Plane.XY.offset(5), mode=Mode.PRIVATE) as cut_extrude3_sk3:
        Polygon((-125, 10), (-165, 50), (-85, 50), align=None)
    cut_extrude3_tool3 = extrude(cut_extrude3_sk3.sketch, amount=-CUT_EXTRUDE3_REACH, mode=Mode.PRIVATE) & part.part
    add(cut_extrude3_tool3.solids().sort_by_distance((-125, 36.666667, 5))[0], mode=Mode.SUBTRACT)

    # Fillet1
    fillet1_edges = [part.edges().sort_by_distance(p)[0] for p in [
        (-325, 10, 2.5),
        (-365, 50, 2.5),
        (-285, 50, 2.5),
        (-265, 50, 2.5),
        (-185, 50, 2.5),
        (-165, 50, 2.5),
        (-85, 50, 2.5),
        (-125, 10, 2.5),
        (-375, 50, 2.5),
        (-335, 10, 2.5),
        (-375, 10, 2.5),
        (-315, 10, 2.5),
        (-275, 50, 2.5),
        (-235, 10, 2.5),
        (-215, 10, 2.5),
        (-175, 50, 2.5),
        (-135, 10, 2.5),
        (-65, 50, 2.5),
        (-25, 50, 2.5),
        (-25, 10, 2.5),
        (-75, 50, 2.5),
        (-35, 10, 2.5),
        (-115, 10, 2.5),
    ]]
    fillet(fillet1_edges, radius=FILLET1_R)

    # M6x1.0 Tapped Hole1 (through all)
    with Locations(Plane.XY.offset(5)):
        with Locations((-12.5, 52.5), (-12.5, 37.5), (-12.5, 22.5), (-12.5, 7.5)):
            Hole(M6X1_0_TAPPED_HOLE1_D / 2)

    # M4x0.7 Tapped Hole1 (through all)
    with Locations(Plane.XY.offset(5)):
        with Locations((-225, 5), (-175, 55), (-125, 5), (-75, 55), (-275, 55), (-325, 5)):
            Hole(M4X0_7_TAPPED_HOLE1_D / 2)

    # Sketch9 → Boss-Extrude2 (add)
    with BuildSketch(Plane.XY.offset(5)):
        with BuildLine():
            Line((-205.342623586, 0), (-141.342623586, 0))
            ThreePointArc((-141.342623586, 0), (-173.342623586, -32), (-205.342623586, 0))
        make_face()
    extrude(amount=-BOSS_EXTRUDE2_DEPTH)

    # Fillet2
    fillet2_edges = [part.edges().sort_by_distance(p)[0] for p in [
        (-205.342623586, 0, 2.5),
        (-141.342623586, 0, 2.5),
    ]]
    fillet(fillet2_edges, radius=FILLET2_R)

    # Ø10.0mm Dowel Hole1 (through all)
    with Locations(Plane.XY.offset(5)):
        with Locations((-173.342623586, -15)):
            Hole(F_10_0MM_DOWEL_HOLE1_D / 2)

    # Sketch12 → Boss-Extrude3 (add)
    with BuildSketch(Plane.XY.offset(5)):
        with BuildLine():
            Line((0, 76), (0, 50))
            ThreePointArc((0, 50), (-6.566018868, 57.294369811), (-16, 60))
            ThreePointArc((-16, 60), (-4.686291501, 64.686291501), (0, 76))
        make_face()
        with BuildLine():
            Line((0, 10), (0, -16))
            ThreePointArc((0, -16), (-4.686291501, -4.686291501), (-16, 0))
            ThreePointArc((-16, 0), (-6.566018868, 2.705630189), (0, 10))
        make_face()
    extrude(amount=-BOSS_EXTRUDE3_DEPTH)

    # Ø12.0mm Dowel Hole1
    with Locations(Plane.XY.offset(5)):
        with Locations((-390, 30)):
            Hole(F_12_0MM_DOWEL_HOLE1_D / 2, depth=F_12_0MM_DOWEL_HOLE1_DEPTH)


solid = part.part
